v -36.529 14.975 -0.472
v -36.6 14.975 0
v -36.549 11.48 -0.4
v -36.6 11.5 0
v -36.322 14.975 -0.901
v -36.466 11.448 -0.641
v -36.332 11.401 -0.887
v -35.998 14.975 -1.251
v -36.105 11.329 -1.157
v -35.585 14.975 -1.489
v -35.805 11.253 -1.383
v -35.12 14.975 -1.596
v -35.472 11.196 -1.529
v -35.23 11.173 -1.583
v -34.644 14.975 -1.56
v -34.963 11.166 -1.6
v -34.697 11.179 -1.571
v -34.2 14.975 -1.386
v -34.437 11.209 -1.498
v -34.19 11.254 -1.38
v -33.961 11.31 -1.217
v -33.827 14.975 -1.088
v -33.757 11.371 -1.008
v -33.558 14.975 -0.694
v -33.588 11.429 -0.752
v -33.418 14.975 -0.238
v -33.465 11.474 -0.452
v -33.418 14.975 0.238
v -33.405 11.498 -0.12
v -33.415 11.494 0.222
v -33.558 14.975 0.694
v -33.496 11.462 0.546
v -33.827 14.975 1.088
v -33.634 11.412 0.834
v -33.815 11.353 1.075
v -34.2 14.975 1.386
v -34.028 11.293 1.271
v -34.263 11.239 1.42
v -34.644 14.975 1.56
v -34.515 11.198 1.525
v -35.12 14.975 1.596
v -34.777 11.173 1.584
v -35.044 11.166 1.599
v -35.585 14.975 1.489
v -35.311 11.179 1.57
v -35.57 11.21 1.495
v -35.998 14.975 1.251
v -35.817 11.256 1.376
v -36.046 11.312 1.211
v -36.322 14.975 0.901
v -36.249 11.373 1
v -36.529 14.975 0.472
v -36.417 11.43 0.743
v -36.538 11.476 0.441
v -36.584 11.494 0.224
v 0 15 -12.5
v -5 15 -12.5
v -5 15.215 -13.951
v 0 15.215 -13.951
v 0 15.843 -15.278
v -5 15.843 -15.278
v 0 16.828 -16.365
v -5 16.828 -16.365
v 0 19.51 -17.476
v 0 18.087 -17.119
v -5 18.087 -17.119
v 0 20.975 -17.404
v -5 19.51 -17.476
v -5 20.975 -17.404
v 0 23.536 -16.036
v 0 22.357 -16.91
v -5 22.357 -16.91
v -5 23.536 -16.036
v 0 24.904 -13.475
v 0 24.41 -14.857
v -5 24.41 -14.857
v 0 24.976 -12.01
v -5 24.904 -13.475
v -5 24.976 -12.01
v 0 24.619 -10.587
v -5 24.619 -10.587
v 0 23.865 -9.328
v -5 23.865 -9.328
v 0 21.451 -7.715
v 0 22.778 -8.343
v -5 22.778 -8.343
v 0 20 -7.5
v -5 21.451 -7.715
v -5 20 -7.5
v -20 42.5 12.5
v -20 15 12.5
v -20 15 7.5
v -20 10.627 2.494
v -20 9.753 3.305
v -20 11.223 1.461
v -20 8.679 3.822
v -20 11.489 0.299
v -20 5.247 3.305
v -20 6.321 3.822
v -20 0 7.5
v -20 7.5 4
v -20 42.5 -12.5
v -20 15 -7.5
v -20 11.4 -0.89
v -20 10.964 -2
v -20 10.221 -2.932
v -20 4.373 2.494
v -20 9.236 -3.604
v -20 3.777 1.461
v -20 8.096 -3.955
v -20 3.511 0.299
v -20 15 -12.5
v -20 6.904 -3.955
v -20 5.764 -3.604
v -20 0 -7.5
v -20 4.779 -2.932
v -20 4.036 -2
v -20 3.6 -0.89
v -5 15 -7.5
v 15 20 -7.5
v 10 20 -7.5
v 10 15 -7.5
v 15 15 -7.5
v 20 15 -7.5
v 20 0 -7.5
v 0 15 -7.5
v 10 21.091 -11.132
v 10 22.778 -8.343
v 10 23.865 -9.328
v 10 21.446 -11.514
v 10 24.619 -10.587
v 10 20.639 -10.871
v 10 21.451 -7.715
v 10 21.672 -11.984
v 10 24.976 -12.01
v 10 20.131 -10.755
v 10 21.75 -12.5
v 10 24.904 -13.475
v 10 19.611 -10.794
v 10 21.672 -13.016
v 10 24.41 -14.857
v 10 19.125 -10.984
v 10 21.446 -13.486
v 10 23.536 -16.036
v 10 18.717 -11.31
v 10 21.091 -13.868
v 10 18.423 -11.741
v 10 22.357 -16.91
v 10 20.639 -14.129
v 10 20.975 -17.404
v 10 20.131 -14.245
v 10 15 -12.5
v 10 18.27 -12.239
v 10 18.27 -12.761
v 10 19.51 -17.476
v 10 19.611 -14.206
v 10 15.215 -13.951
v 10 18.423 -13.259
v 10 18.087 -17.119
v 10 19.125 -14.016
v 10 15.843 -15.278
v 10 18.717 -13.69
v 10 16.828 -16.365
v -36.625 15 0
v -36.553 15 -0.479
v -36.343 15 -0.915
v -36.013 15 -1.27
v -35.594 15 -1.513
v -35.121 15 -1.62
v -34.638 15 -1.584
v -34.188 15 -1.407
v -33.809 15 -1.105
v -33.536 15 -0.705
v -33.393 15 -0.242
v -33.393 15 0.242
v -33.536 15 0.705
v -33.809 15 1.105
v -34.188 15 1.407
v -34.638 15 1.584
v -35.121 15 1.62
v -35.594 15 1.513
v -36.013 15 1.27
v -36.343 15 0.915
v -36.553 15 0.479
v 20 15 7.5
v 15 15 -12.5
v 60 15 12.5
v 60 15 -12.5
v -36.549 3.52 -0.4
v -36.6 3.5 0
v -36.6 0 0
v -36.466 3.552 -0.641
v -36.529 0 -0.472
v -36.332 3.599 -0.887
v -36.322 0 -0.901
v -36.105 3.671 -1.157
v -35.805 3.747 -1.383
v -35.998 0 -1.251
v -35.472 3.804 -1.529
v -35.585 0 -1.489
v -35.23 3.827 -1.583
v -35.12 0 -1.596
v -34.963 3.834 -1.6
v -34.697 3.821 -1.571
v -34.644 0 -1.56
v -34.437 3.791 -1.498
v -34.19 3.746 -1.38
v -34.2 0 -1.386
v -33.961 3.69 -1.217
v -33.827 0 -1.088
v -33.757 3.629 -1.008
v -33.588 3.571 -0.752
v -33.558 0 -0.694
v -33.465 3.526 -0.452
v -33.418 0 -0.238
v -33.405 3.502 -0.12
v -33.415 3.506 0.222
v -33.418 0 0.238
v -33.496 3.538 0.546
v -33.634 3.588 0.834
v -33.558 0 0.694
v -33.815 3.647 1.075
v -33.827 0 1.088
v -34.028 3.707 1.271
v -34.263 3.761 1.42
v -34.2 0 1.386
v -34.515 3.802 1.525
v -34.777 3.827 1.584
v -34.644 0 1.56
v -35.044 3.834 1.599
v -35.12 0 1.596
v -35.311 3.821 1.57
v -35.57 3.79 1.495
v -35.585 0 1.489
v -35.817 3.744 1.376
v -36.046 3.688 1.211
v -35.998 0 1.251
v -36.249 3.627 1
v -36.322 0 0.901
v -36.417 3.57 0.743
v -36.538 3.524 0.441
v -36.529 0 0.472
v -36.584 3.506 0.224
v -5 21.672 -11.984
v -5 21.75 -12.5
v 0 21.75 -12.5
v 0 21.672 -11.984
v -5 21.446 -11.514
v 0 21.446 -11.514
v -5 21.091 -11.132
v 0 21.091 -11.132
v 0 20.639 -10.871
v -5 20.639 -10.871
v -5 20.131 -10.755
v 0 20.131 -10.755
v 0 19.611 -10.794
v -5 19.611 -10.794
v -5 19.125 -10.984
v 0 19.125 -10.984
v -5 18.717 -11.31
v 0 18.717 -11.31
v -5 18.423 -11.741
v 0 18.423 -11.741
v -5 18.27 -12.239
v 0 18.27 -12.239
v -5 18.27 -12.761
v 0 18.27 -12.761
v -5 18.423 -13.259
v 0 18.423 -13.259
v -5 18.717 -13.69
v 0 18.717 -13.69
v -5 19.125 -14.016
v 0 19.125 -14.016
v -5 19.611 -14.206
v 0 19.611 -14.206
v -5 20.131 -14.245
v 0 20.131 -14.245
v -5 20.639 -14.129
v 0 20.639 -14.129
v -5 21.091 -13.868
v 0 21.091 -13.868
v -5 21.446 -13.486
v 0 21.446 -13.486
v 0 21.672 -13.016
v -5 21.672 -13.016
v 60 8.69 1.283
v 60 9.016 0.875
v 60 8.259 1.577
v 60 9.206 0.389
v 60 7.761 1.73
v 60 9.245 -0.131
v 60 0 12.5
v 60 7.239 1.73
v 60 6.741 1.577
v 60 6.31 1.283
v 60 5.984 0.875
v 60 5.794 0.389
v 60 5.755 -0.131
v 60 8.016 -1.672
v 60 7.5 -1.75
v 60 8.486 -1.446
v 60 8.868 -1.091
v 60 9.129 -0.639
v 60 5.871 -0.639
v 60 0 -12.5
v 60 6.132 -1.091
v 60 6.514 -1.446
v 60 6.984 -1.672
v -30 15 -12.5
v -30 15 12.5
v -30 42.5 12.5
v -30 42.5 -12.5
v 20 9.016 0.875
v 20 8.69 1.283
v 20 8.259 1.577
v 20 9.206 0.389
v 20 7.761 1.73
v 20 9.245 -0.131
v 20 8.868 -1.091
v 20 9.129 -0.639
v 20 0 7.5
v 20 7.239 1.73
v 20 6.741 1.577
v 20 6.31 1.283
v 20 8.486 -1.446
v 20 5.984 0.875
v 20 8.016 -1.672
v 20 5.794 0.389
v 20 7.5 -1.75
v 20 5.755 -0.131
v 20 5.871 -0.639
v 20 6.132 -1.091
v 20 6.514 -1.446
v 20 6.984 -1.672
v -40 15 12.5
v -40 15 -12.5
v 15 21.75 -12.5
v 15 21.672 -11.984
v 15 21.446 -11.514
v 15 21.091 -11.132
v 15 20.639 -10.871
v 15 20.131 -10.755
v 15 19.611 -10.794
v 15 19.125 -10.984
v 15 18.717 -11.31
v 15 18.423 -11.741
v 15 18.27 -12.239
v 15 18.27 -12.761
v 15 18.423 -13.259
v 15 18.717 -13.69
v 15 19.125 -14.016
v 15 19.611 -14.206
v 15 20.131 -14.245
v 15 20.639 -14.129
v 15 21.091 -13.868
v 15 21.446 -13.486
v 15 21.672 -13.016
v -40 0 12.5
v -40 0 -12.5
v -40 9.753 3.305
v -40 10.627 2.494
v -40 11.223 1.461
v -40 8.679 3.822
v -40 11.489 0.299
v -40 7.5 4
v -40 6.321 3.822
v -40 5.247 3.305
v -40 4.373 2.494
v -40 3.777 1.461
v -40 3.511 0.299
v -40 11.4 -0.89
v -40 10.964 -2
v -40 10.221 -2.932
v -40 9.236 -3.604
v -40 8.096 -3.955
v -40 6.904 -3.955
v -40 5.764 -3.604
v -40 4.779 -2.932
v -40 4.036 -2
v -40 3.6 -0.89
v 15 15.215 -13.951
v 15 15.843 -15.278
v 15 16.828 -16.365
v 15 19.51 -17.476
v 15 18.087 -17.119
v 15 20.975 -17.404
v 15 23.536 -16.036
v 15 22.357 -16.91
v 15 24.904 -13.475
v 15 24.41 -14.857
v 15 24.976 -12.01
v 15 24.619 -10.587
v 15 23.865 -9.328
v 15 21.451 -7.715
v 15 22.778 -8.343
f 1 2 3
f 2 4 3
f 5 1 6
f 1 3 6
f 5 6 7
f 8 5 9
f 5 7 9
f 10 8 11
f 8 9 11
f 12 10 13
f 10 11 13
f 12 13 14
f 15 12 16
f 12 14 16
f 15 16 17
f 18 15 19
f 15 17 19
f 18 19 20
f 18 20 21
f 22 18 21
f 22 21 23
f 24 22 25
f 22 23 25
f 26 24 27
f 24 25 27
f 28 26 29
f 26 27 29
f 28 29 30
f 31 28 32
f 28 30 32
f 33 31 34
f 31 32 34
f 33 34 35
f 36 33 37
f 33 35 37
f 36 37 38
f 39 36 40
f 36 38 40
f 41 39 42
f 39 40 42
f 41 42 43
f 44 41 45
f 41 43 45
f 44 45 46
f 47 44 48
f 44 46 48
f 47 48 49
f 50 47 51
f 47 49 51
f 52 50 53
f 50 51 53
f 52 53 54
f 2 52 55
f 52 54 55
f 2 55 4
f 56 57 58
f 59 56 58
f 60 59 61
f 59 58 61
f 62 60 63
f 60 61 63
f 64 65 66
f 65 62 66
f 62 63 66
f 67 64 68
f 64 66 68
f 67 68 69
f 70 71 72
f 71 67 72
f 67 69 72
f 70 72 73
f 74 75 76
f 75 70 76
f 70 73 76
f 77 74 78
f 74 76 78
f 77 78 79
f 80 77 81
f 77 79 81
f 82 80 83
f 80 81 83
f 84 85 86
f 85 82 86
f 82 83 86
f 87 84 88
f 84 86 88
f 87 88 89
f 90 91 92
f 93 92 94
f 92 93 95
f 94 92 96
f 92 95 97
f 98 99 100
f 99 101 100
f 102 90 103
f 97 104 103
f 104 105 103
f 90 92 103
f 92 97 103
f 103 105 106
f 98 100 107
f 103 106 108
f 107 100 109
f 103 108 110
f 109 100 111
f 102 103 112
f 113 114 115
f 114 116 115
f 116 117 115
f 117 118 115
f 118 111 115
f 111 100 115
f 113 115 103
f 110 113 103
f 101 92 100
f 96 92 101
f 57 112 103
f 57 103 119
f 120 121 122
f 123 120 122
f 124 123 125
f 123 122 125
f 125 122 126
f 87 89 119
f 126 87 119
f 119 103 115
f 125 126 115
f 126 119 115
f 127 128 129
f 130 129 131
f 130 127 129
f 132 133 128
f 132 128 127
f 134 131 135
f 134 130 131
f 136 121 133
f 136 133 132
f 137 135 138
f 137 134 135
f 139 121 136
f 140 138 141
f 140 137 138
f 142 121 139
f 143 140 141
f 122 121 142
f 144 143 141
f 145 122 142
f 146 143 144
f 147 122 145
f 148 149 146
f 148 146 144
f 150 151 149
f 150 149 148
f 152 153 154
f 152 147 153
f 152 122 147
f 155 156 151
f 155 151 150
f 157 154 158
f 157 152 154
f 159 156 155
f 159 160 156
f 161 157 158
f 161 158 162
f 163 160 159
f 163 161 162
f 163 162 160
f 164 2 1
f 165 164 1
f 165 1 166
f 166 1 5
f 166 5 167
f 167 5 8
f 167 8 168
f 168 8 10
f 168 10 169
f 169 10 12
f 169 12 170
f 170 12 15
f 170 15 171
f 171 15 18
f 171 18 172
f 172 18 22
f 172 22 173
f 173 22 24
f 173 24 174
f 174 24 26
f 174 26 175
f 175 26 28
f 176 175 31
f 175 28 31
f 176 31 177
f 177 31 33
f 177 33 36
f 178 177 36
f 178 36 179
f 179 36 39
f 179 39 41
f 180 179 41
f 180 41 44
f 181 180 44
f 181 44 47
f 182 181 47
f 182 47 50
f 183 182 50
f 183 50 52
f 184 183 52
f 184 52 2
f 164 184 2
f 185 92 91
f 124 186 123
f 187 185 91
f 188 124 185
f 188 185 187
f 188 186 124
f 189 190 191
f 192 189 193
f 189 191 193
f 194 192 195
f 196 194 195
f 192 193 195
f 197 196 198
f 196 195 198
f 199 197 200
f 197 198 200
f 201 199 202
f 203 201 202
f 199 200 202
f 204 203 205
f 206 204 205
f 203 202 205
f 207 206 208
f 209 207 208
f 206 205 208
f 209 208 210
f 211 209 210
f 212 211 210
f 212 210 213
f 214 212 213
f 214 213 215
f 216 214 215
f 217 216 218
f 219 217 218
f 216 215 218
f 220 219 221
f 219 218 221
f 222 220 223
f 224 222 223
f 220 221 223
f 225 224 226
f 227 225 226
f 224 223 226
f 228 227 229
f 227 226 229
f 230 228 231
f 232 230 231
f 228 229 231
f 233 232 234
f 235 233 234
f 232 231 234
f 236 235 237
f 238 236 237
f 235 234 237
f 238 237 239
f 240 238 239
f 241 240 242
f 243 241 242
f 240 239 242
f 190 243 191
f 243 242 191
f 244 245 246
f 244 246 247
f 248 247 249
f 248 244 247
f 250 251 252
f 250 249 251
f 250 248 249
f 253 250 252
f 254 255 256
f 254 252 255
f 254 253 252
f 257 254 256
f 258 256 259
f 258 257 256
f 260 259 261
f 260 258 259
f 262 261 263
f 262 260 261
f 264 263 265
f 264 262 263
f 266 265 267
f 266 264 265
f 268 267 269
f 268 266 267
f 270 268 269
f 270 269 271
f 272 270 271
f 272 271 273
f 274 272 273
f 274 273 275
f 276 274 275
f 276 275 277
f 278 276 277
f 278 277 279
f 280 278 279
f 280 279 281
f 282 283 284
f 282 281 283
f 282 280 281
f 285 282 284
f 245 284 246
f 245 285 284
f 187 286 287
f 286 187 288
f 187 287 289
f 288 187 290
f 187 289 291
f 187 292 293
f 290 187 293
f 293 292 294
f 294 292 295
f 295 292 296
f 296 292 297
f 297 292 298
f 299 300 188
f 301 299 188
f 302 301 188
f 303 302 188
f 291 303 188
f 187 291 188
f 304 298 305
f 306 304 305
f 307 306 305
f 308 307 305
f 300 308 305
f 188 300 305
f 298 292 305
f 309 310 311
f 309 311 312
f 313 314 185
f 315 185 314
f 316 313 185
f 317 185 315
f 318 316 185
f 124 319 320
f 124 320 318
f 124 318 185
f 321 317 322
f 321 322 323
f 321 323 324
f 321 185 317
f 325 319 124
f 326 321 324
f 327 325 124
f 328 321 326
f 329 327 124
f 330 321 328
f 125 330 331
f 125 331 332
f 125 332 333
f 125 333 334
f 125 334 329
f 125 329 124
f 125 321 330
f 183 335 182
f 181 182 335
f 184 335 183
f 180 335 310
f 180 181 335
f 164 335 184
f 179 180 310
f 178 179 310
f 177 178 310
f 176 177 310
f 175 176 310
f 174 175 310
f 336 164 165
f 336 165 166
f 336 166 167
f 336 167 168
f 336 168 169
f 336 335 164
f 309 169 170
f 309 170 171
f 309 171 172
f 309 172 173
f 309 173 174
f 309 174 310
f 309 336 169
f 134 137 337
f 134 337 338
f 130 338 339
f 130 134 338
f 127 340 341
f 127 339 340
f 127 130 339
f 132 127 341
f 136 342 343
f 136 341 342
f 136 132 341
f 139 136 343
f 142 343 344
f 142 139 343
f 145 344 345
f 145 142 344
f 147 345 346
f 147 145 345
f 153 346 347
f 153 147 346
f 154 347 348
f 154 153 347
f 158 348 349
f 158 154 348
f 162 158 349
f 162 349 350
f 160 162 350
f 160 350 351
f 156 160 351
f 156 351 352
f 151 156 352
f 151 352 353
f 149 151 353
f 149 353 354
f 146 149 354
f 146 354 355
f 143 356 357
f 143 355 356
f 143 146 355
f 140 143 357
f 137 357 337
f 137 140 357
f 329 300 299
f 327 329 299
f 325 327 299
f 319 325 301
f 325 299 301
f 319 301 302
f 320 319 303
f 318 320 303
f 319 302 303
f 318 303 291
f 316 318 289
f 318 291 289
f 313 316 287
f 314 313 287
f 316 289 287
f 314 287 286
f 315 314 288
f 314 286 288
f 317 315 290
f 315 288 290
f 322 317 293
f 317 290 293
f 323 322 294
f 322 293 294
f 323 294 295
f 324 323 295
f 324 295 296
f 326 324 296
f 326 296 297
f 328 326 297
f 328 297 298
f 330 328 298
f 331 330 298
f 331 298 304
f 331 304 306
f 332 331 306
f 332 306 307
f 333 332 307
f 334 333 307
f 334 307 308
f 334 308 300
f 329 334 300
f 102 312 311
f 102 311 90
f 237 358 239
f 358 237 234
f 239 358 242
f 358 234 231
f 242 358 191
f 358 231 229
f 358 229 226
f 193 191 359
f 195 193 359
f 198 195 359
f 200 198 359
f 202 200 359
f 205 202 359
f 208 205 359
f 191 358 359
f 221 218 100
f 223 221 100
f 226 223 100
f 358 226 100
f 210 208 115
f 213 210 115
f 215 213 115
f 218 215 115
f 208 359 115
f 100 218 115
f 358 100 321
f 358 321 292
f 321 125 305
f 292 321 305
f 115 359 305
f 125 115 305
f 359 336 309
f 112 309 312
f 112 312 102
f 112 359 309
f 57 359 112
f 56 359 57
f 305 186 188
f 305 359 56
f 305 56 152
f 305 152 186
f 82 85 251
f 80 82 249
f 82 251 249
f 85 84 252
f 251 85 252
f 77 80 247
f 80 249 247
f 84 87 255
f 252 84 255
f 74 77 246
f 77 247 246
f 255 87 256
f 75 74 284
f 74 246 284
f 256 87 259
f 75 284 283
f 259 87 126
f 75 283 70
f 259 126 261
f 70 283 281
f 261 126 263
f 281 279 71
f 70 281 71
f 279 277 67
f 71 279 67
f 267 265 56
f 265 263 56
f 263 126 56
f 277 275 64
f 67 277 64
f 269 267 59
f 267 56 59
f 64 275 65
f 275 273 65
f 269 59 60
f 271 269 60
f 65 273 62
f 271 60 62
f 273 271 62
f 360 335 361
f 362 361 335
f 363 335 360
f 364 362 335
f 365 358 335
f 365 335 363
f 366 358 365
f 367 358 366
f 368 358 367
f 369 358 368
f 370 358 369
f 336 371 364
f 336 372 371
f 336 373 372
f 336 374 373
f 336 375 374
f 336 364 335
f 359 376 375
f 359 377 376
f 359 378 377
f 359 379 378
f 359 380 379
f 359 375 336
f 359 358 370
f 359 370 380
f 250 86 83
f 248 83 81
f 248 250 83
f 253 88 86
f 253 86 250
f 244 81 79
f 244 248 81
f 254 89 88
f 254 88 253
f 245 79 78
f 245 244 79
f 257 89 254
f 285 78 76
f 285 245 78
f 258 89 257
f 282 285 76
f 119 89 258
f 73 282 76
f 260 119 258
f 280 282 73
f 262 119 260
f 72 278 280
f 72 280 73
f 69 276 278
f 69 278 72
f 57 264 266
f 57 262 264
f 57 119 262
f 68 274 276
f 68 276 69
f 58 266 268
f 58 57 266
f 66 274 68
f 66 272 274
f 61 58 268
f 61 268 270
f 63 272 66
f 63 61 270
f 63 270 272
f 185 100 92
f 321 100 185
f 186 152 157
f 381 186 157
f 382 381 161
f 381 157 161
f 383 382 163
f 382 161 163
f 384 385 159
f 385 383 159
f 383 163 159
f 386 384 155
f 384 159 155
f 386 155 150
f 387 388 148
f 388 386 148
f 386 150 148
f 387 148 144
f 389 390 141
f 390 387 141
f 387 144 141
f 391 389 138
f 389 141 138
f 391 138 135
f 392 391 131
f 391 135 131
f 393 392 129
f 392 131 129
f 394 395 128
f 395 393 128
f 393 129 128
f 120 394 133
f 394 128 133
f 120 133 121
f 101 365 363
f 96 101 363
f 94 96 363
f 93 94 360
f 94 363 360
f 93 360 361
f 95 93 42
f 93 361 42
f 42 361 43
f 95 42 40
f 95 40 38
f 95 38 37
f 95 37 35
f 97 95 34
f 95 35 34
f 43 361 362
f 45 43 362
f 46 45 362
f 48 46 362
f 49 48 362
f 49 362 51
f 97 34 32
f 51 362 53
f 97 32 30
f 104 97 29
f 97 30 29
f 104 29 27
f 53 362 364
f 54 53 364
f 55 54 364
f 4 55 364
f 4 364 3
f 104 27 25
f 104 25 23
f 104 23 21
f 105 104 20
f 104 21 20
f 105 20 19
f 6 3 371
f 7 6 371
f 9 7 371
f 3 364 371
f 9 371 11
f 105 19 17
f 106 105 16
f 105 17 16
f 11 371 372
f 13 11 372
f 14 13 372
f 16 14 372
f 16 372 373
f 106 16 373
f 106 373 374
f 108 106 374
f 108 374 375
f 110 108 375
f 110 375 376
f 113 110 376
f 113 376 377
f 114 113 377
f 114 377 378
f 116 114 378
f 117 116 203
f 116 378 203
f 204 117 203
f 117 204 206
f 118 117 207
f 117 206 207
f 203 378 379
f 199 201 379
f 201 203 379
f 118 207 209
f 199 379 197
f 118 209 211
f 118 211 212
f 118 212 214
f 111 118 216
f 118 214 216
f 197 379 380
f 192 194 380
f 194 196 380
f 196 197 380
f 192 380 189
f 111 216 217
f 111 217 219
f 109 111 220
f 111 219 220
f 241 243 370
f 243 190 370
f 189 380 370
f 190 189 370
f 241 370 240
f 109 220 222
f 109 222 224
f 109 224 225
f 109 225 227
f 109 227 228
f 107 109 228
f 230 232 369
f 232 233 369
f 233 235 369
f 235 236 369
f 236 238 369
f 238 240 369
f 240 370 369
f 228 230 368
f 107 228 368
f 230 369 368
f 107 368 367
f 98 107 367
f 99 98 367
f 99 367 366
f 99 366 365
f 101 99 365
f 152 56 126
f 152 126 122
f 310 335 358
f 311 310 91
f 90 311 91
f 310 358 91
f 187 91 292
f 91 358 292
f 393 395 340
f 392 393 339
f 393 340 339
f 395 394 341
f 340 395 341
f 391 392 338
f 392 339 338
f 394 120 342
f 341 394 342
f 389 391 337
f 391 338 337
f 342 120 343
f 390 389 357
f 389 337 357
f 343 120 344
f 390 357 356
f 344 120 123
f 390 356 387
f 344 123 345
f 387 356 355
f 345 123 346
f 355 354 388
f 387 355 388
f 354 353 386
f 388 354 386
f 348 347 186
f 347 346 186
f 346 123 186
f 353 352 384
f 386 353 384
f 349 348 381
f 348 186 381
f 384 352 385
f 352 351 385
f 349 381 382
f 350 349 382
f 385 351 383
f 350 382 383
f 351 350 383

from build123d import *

# Parameters (mm, degrees)
SKETCH2_W                            = 100
SKETCH2_H                            = 25
SKETCH2_W_2                          = 40
SKETCH2_H_2                          = 15
BOSS_EXTRUDE1_DEPTH                  = 15
CUT_EXTRUDE1_REACH                   = 103.888
SKETCH3_R                            = 1.75
CUT_EXTRUDE2_REACH                   = 103.888
SKETCH4_R                            = 4
F_3_2_3_2_DIAMETER_HOLE1_D           = 3.2
F_3_2_3_2_DIAMETER_HOLE1_CSINK_D     = 3.25
F_3_2_3_2_DIAMETER_HOLE1_CSINK_ANGLE = 90
SKETCH8_W                            = 10
SKETCH8_H                            = 25
BOSS_EXTRUDE2_DEPTH                  = 27.5
SKETCH9_R                            = 1.75
BOSS_EXTRUDE3_DEPTH                  = 40
CUT_EXTRUDE3_REACH                   = 70.283
SKETCH10_W                           = 15
SKETCH10_H                           = 10
SKETCH10_W_2                         = 10
SKETCH10_W_3                         = 5


with BuildPart() as part:
    # Sketch2 → Boss-Extrude1 (new body)
    with BuildSketch(Plane(origin=(0, 0, 0), x_dir=(1, 0, 0), z_dir=(0, 1, 0))):
        with Locations((10, 0)):
            Rectangle(SKETCH2_W, SKETCH2_H)
        Rectangle(SKETCH2_W_2, SKETCH2_H_2, mode=Mode.SUBTRACT)
    extrude(amount=BOSS_EXTRUDE1_DEPTH)

    # Sketch3 → Cut-Extrude1 (cut, up to next)
    with BuildSketch(Plane(origin=(60, 0, 0), x_dir=(0, 0, -1), z_dir=(1, 0, 0)), mode=Mode.PRIVATE) as cut_extrude1_sk1:
        with Locations((0, 7.5)):
            Circle(SKETCH3_R)
    cut_extrude1_tool1 = extrude(cut_extrude1_sk1.sketch, amount=-CUT_EXTRUDE1_REACH, mode=Mode.PRIVATE) & part.part
    add(cut_extrude1_tool1.solids().sort_by_distance((60, 7.5, 0))[0], mode=Mode.SUBTRACT)

    # Sketch4 → Cut-Extrude2 (cut, up to next)
    with BuildSketch(Plane.ZY.offset(40), mode=Mode.PRIVATE) as cut_extrude2_sk1:
        with Locations((0, 7.5)):
            Circle(SKETCH4_R)
    cut_extrude2_tool1 = extrude(cut_extrude2_sk1.sketch, amount=-CUT_EXTRUDE2_REACH, mode=Mode.PRIVATE) & part.part
    add(cut_extrude2_tool1.solids().sort_by_distance((-40, 7.5, 0))[0], mode=Mode.SUBTRACT)

    # Ø3.2 (3.2) Diameter Hole1 (through all)
    with Locations(Plane(origin=(0, 15, 0), x_dir=(1, 0, 0), z_dir=(0, 1, 0))):
        with Locations((-35, 0)):
            CounterSinkHole(F_3_2_3_2_DIAMETER_HOLE1_D / 2, F_3_2_3_2_DIAMETER_HOLE1_CSINK_D / 2, counter_sink_angle=F_3_2_3_2_DIAMETER_HOLE1_CSINK_ANGLE)

    # Sketch8 → Boss-Extrude2 (add)
    with BuildSketch(Plane(origin=(0, 15, 0), x_dir=(1, 0, 0), z_dir=(0, 1, 0))):
        with Locations((-25, 0)):
            Rectangle(SKETCH8_W, SKETCH8_H)
    extrude(amount=BOSS_EXTRUDE2_DEPTH)

    # Sketch9 → Boss-Extrude3 (add)
    with BuildSketch(Plane(origin=(-20, 0, 0), x_dir=(0, 0, -1), z_dir=(1, 0, 0))):
        with BuildLine():
            Line((7.5, 20), (7.5, 15))
            Line((7.5, 15), (12.5, 15))
            ThreePointArc((12.5, 15), (16.035533906, 23.535533906), (7.5, 20))
        make_face()
        with Locations(Location((12.5, 20, 0), (0, 0, 90))):
            Circle(SKETCH9_R, mode=Mode.SUBTRACT)
    extrude(amount=BOSS_EXTRUDE3_DEPTH)

    # Sketch10 → Cut-Extrude3 (cut, up to next)
    with BuildSketch(Plane(origin=(0, 15, 0), x_dir=(1, 0, 0), z_dir=(0, 1, 0)), mode=Mode.PRIVATE) as cut_extrude3_sk1:
        with Locations((-12.5, 12.5)):
            Rectangle(SKETCH10_W, SKETCH10_H)
    cut_extrude3_tool1 = extrude(cut_extrude3_sk1.sketch, amount=CUT_EXTRUDE3_REACH, mode=Mode.PRIVATE) & part.part
    # Sketch10 → Cut-Extrude3 (cut, up to next)
    with BuildSketch(Plane(origin=(0, 15, 0), x_dir=(1, 0, 0), z_dir=(0, 1, 0)), mode=Mode.PRIVATE) as cut_extrude3_sk2:
        with Locations((5, 12.5)):
            Rectangle(SKETCH10_W_2, SKETCH10_H)
    cut_extrude3_tool2 = extrude(cut_extrude3_sk2.sketch, amount=CUT_EXTRUDE3_REACH, mode=Mode.PRIVATE) & part.part
    # Sketch10 → Cut-Extrude3 (cut, up to next)
    with BuildSketch(Plane(origin=(0, 15, 0), x_dir=(1, 0, 0), z_dir=(0, 1, 0)), mode=Mode.PRIVATE) as cut_extrude3_sk3:
        with Locations((17.5, 12.5)):
            Rectangle(SKETCH10_W_3, SKETCH10_H)
    cut_extrude3_tool3 = extrude(cut_extrude3_sk3.sketch, amount=CUT_EXTRUDE3_REACH, mode=Mode.PRIVATE) & part.part
    add(cut_extrude3_tool1.solids().sort_by_distance((-12.5, 15, -12.5))[0], mode=Mode.SUBTRACT)
    add(cut_extrude3_tool2.solids().sort_by_distance((5, 15, -12.5))[0], mode=Mode.SUBTRACT)
    add(cut_extrude3_tool3.solids().sort_by_distance((17.5, 15, -12.5))[0], mode=Mode.SUBTRACT)


solid = part.part
